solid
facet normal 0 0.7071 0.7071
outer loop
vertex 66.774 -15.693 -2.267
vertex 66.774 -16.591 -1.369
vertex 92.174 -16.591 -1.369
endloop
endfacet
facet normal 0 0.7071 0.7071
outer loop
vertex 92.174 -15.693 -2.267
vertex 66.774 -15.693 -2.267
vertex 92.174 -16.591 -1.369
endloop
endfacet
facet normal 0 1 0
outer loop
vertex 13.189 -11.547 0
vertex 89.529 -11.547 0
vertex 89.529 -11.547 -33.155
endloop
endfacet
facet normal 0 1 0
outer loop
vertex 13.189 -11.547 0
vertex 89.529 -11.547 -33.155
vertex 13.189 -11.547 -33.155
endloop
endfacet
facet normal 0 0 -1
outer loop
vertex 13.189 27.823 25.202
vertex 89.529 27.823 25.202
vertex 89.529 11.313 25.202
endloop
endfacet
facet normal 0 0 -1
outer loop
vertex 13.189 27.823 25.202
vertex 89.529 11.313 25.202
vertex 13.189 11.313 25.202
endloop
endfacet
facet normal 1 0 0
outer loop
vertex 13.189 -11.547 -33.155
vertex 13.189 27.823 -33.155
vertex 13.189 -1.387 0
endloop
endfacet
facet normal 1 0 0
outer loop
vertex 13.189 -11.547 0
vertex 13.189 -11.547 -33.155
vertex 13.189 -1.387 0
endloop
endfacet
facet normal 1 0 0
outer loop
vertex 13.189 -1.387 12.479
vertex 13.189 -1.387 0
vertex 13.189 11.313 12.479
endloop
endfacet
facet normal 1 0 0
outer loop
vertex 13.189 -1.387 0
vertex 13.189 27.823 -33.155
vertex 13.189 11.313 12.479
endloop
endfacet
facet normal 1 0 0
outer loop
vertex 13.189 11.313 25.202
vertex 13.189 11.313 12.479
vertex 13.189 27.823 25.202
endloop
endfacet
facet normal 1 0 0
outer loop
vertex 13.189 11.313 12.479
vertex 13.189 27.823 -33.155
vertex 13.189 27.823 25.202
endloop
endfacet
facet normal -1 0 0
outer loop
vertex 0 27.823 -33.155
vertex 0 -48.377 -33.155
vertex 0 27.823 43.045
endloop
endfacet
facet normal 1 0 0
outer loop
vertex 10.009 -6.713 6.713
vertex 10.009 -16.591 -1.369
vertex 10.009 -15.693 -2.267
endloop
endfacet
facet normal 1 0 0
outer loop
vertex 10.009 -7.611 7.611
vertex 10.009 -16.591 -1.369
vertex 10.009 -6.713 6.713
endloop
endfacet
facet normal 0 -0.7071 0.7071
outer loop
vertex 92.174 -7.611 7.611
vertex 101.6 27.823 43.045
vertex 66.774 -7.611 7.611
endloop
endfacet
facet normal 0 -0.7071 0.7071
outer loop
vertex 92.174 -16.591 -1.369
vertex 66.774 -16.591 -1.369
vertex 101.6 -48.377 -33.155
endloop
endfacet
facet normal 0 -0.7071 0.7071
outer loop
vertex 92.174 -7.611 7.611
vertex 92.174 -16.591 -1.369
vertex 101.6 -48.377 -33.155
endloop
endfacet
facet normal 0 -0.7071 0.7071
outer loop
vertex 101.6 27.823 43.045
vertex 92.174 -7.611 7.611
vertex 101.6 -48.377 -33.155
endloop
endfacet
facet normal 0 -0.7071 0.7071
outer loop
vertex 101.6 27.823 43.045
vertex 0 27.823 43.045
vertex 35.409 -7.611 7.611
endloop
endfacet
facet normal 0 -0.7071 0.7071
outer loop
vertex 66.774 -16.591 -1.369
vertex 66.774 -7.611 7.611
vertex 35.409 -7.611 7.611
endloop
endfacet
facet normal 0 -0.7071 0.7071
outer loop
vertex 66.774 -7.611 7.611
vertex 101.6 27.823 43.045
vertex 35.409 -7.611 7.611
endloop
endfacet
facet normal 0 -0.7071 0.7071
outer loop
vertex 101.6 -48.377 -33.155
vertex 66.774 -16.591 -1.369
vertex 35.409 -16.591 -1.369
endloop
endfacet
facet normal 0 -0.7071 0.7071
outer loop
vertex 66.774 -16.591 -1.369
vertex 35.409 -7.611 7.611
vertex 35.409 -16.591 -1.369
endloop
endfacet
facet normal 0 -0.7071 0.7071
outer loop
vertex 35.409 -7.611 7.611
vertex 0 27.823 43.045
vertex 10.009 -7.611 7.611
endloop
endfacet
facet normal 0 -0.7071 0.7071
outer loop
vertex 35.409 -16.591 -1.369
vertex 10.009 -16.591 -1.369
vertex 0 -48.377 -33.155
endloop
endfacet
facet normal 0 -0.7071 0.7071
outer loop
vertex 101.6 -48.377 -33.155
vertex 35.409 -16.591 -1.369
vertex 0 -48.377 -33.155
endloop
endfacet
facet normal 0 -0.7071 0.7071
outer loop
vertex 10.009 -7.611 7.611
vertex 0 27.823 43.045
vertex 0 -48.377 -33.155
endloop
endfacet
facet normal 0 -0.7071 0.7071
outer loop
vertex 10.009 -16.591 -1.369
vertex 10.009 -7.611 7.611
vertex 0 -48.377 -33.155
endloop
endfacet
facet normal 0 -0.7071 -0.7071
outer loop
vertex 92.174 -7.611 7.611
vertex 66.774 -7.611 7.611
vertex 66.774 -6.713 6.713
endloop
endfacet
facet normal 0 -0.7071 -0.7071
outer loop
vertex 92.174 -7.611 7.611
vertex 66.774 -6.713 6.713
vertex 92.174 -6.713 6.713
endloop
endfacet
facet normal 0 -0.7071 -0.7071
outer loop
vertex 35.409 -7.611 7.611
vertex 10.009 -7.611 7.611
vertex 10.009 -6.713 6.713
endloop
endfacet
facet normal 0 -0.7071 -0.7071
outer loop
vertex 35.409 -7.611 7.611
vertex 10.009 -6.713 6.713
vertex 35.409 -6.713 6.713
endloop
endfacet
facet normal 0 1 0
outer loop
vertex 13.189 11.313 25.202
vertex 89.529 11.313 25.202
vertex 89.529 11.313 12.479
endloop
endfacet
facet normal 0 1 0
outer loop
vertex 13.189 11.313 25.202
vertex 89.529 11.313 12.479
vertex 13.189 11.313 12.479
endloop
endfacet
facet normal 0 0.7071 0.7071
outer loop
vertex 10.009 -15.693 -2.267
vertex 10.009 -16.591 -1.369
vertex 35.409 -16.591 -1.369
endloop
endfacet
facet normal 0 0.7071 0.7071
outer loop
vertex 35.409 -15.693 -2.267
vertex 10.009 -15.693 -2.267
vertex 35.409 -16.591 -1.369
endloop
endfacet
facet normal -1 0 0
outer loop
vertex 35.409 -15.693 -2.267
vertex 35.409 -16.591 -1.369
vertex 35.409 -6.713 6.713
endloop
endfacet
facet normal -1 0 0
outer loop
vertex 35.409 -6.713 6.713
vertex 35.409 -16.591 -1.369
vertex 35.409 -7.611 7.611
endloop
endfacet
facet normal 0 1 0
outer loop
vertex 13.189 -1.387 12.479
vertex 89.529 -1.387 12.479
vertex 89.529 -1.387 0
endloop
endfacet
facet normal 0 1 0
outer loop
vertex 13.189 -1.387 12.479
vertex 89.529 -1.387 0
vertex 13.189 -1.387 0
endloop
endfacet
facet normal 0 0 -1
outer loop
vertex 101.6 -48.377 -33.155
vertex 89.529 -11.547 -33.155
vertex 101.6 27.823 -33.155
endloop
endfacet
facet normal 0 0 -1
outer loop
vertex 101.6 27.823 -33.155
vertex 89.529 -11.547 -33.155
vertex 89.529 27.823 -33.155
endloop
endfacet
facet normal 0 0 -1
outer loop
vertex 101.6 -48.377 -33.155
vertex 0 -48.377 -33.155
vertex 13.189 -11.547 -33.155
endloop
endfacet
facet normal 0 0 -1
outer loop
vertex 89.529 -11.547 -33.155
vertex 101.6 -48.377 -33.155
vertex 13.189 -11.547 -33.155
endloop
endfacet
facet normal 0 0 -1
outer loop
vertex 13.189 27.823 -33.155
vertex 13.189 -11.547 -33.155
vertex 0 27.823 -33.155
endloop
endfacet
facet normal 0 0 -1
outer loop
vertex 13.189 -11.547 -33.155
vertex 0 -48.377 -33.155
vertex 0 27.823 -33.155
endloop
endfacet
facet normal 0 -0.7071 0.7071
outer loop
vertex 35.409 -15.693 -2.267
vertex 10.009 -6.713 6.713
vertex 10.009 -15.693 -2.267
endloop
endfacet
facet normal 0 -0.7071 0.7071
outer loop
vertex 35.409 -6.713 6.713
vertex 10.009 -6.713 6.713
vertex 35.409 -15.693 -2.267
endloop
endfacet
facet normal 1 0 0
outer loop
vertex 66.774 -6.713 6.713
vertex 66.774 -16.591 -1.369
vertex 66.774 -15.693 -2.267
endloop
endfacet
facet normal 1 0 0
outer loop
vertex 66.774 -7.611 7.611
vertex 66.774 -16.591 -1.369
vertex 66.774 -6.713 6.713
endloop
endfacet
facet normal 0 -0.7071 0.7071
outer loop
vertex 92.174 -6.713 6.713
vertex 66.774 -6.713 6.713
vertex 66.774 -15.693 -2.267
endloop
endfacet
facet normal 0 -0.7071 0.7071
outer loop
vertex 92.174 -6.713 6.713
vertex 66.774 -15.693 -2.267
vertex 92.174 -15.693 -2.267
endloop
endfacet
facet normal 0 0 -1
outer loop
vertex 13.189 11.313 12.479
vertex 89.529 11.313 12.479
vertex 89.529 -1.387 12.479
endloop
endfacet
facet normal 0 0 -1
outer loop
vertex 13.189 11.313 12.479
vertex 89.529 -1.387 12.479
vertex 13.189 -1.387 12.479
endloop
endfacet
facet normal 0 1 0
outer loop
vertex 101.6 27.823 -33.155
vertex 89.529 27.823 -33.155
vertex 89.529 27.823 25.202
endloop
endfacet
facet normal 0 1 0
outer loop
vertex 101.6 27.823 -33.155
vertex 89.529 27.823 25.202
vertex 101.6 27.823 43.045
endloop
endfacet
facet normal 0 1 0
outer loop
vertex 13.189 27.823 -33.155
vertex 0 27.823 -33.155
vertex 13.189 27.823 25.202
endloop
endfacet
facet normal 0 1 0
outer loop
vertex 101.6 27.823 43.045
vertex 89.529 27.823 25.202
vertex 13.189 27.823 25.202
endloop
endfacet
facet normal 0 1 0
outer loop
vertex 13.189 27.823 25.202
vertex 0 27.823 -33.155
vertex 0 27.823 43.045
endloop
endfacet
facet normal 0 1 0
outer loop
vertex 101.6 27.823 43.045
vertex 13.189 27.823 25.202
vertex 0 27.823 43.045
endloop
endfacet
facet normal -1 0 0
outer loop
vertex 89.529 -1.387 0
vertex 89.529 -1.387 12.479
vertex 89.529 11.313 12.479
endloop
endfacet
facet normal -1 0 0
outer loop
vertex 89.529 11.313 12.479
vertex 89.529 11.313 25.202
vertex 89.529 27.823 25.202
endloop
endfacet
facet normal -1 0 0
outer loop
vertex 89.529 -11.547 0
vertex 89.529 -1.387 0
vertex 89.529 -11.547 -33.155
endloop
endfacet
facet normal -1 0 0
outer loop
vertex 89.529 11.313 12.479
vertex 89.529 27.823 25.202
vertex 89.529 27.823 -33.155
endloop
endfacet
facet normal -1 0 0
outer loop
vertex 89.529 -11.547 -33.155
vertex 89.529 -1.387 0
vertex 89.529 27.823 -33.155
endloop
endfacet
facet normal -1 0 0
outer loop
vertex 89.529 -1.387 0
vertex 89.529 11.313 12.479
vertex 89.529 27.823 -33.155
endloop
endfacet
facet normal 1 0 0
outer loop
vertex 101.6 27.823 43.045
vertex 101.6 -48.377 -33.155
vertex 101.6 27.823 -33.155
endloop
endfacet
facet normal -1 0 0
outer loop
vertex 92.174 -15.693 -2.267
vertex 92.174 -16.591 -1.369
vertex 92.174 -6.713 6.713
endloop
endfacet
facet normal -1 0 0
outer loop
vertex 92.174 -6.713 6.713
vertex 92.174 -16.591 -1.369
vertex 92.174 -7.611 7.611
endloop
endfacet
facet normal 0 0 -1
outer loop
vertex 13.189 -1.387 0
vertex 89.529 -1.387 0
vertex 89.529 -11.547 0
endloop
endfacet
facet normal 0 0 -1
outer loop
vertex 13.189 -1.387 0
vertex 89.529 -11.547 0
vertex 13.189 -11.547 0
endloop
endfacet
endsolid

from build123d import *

# Parameters (mm, degrees)
F1_DEPTH = 101.6
F2_W     = 25.4
F2_H     = 12.7
F3_DEPTH = 1.27
F4_W     = 76.3398231938
F4_H     = 12.2339436784
F4_H_2   = 12.9679823294
F4_H_3   = 10.0934545674
F4_H_4   = 11.5307184484
F5_DEPTH = 16.51
F6_W     = 76.3398231938
F6_H     = 45.6335150034
F7_DEPTH = 12.7
F8_W     = 76.3398231938
F8_H     = 33.1548914642
F9_DEPTH = 10.16


with BuildPart() as f1:
    # F0 (on Right) → F1 (new body)
    with BuildSketch(Plane.YZ):
        Polygon((27.8234868258, 43.0451085358), (-48.3765131742, -33.1548914642), (27.8234868258, -33.1548914642), align=None)
    extrude(amount=F1_DEPTH)

    # F2 (on face) → F3 (cut)
    with BuildSketch(Plane(origin=(0, -7.610810855, 7.610810855), x_dir=(1, 0, 0), z_dir=(0, -0.7071067812, 0.7071067812))):
        with Locations((22.7085306913, -6.35)):
            Rectangle(F2_W, F2_H)
        with Locations((79.47403301, -6.35)):
            Rectangle(F2_W, F2_H)
    extrude(amount=-F3_DEPTH, mode=Mode.SUBTRACT)

    # F4 (on face) → F5 (cut)
    with BuildSketch(Plane(origin=(0, 27.8234868258, 0), x_dir=(-1, 0, 0), z_dir=(0, 1, 0))):
        with Locations((-51.3592674397, 19.0849541686)):
            Rectangle(F4_W, F4_H)
        with Locations((-51.3592674397, 6.4839911647)):
            Rectangle(F4_W, F4_H_2)
        with Locations((-51.3592674397, -5.0467272837)):
            Rectangle(F4_W, F4_H_3)
        with Locations((-51.3592674397, -15.8588137916)):
            Rectangle(F4_W, F4_H_4)
        with Locations((-51.3592674397, -27.38953224)):
            Rectangle(F4_W, F4_H_4)
    extrude(amount=-F5_DEPTH, mode=Mode.SUBTRACT)

    # F6 (on face) → F7 (cut)
    with BuildSketch(Plane(origin=(0, 11.3134868258, 0), x_dir=(-1, 0, 0), z_dir=(0, 1, 0))):
        with Locations((-51.3592674397, -10.3381339625)):
            Rectangle(F6_W, F6_H)
    extrude(amount=-F7_DEPTH, mode=Mode.SUBTRACT)

    # F8 (on face) → F9 (cut)
    with BuildSketch(Plane(origin=(0, -1.3865131742, 0), x_dir=(-1, 0, 0), z_dir=(0, 1, 0))):
        with Locations((-51.3592674397, -16.5774457321)):
            Rectangle(F8_W, F8_H)
    extrude(amount=-F9_DEPTH, mode=Mode.SUBTRACT)


solid = f1.part
